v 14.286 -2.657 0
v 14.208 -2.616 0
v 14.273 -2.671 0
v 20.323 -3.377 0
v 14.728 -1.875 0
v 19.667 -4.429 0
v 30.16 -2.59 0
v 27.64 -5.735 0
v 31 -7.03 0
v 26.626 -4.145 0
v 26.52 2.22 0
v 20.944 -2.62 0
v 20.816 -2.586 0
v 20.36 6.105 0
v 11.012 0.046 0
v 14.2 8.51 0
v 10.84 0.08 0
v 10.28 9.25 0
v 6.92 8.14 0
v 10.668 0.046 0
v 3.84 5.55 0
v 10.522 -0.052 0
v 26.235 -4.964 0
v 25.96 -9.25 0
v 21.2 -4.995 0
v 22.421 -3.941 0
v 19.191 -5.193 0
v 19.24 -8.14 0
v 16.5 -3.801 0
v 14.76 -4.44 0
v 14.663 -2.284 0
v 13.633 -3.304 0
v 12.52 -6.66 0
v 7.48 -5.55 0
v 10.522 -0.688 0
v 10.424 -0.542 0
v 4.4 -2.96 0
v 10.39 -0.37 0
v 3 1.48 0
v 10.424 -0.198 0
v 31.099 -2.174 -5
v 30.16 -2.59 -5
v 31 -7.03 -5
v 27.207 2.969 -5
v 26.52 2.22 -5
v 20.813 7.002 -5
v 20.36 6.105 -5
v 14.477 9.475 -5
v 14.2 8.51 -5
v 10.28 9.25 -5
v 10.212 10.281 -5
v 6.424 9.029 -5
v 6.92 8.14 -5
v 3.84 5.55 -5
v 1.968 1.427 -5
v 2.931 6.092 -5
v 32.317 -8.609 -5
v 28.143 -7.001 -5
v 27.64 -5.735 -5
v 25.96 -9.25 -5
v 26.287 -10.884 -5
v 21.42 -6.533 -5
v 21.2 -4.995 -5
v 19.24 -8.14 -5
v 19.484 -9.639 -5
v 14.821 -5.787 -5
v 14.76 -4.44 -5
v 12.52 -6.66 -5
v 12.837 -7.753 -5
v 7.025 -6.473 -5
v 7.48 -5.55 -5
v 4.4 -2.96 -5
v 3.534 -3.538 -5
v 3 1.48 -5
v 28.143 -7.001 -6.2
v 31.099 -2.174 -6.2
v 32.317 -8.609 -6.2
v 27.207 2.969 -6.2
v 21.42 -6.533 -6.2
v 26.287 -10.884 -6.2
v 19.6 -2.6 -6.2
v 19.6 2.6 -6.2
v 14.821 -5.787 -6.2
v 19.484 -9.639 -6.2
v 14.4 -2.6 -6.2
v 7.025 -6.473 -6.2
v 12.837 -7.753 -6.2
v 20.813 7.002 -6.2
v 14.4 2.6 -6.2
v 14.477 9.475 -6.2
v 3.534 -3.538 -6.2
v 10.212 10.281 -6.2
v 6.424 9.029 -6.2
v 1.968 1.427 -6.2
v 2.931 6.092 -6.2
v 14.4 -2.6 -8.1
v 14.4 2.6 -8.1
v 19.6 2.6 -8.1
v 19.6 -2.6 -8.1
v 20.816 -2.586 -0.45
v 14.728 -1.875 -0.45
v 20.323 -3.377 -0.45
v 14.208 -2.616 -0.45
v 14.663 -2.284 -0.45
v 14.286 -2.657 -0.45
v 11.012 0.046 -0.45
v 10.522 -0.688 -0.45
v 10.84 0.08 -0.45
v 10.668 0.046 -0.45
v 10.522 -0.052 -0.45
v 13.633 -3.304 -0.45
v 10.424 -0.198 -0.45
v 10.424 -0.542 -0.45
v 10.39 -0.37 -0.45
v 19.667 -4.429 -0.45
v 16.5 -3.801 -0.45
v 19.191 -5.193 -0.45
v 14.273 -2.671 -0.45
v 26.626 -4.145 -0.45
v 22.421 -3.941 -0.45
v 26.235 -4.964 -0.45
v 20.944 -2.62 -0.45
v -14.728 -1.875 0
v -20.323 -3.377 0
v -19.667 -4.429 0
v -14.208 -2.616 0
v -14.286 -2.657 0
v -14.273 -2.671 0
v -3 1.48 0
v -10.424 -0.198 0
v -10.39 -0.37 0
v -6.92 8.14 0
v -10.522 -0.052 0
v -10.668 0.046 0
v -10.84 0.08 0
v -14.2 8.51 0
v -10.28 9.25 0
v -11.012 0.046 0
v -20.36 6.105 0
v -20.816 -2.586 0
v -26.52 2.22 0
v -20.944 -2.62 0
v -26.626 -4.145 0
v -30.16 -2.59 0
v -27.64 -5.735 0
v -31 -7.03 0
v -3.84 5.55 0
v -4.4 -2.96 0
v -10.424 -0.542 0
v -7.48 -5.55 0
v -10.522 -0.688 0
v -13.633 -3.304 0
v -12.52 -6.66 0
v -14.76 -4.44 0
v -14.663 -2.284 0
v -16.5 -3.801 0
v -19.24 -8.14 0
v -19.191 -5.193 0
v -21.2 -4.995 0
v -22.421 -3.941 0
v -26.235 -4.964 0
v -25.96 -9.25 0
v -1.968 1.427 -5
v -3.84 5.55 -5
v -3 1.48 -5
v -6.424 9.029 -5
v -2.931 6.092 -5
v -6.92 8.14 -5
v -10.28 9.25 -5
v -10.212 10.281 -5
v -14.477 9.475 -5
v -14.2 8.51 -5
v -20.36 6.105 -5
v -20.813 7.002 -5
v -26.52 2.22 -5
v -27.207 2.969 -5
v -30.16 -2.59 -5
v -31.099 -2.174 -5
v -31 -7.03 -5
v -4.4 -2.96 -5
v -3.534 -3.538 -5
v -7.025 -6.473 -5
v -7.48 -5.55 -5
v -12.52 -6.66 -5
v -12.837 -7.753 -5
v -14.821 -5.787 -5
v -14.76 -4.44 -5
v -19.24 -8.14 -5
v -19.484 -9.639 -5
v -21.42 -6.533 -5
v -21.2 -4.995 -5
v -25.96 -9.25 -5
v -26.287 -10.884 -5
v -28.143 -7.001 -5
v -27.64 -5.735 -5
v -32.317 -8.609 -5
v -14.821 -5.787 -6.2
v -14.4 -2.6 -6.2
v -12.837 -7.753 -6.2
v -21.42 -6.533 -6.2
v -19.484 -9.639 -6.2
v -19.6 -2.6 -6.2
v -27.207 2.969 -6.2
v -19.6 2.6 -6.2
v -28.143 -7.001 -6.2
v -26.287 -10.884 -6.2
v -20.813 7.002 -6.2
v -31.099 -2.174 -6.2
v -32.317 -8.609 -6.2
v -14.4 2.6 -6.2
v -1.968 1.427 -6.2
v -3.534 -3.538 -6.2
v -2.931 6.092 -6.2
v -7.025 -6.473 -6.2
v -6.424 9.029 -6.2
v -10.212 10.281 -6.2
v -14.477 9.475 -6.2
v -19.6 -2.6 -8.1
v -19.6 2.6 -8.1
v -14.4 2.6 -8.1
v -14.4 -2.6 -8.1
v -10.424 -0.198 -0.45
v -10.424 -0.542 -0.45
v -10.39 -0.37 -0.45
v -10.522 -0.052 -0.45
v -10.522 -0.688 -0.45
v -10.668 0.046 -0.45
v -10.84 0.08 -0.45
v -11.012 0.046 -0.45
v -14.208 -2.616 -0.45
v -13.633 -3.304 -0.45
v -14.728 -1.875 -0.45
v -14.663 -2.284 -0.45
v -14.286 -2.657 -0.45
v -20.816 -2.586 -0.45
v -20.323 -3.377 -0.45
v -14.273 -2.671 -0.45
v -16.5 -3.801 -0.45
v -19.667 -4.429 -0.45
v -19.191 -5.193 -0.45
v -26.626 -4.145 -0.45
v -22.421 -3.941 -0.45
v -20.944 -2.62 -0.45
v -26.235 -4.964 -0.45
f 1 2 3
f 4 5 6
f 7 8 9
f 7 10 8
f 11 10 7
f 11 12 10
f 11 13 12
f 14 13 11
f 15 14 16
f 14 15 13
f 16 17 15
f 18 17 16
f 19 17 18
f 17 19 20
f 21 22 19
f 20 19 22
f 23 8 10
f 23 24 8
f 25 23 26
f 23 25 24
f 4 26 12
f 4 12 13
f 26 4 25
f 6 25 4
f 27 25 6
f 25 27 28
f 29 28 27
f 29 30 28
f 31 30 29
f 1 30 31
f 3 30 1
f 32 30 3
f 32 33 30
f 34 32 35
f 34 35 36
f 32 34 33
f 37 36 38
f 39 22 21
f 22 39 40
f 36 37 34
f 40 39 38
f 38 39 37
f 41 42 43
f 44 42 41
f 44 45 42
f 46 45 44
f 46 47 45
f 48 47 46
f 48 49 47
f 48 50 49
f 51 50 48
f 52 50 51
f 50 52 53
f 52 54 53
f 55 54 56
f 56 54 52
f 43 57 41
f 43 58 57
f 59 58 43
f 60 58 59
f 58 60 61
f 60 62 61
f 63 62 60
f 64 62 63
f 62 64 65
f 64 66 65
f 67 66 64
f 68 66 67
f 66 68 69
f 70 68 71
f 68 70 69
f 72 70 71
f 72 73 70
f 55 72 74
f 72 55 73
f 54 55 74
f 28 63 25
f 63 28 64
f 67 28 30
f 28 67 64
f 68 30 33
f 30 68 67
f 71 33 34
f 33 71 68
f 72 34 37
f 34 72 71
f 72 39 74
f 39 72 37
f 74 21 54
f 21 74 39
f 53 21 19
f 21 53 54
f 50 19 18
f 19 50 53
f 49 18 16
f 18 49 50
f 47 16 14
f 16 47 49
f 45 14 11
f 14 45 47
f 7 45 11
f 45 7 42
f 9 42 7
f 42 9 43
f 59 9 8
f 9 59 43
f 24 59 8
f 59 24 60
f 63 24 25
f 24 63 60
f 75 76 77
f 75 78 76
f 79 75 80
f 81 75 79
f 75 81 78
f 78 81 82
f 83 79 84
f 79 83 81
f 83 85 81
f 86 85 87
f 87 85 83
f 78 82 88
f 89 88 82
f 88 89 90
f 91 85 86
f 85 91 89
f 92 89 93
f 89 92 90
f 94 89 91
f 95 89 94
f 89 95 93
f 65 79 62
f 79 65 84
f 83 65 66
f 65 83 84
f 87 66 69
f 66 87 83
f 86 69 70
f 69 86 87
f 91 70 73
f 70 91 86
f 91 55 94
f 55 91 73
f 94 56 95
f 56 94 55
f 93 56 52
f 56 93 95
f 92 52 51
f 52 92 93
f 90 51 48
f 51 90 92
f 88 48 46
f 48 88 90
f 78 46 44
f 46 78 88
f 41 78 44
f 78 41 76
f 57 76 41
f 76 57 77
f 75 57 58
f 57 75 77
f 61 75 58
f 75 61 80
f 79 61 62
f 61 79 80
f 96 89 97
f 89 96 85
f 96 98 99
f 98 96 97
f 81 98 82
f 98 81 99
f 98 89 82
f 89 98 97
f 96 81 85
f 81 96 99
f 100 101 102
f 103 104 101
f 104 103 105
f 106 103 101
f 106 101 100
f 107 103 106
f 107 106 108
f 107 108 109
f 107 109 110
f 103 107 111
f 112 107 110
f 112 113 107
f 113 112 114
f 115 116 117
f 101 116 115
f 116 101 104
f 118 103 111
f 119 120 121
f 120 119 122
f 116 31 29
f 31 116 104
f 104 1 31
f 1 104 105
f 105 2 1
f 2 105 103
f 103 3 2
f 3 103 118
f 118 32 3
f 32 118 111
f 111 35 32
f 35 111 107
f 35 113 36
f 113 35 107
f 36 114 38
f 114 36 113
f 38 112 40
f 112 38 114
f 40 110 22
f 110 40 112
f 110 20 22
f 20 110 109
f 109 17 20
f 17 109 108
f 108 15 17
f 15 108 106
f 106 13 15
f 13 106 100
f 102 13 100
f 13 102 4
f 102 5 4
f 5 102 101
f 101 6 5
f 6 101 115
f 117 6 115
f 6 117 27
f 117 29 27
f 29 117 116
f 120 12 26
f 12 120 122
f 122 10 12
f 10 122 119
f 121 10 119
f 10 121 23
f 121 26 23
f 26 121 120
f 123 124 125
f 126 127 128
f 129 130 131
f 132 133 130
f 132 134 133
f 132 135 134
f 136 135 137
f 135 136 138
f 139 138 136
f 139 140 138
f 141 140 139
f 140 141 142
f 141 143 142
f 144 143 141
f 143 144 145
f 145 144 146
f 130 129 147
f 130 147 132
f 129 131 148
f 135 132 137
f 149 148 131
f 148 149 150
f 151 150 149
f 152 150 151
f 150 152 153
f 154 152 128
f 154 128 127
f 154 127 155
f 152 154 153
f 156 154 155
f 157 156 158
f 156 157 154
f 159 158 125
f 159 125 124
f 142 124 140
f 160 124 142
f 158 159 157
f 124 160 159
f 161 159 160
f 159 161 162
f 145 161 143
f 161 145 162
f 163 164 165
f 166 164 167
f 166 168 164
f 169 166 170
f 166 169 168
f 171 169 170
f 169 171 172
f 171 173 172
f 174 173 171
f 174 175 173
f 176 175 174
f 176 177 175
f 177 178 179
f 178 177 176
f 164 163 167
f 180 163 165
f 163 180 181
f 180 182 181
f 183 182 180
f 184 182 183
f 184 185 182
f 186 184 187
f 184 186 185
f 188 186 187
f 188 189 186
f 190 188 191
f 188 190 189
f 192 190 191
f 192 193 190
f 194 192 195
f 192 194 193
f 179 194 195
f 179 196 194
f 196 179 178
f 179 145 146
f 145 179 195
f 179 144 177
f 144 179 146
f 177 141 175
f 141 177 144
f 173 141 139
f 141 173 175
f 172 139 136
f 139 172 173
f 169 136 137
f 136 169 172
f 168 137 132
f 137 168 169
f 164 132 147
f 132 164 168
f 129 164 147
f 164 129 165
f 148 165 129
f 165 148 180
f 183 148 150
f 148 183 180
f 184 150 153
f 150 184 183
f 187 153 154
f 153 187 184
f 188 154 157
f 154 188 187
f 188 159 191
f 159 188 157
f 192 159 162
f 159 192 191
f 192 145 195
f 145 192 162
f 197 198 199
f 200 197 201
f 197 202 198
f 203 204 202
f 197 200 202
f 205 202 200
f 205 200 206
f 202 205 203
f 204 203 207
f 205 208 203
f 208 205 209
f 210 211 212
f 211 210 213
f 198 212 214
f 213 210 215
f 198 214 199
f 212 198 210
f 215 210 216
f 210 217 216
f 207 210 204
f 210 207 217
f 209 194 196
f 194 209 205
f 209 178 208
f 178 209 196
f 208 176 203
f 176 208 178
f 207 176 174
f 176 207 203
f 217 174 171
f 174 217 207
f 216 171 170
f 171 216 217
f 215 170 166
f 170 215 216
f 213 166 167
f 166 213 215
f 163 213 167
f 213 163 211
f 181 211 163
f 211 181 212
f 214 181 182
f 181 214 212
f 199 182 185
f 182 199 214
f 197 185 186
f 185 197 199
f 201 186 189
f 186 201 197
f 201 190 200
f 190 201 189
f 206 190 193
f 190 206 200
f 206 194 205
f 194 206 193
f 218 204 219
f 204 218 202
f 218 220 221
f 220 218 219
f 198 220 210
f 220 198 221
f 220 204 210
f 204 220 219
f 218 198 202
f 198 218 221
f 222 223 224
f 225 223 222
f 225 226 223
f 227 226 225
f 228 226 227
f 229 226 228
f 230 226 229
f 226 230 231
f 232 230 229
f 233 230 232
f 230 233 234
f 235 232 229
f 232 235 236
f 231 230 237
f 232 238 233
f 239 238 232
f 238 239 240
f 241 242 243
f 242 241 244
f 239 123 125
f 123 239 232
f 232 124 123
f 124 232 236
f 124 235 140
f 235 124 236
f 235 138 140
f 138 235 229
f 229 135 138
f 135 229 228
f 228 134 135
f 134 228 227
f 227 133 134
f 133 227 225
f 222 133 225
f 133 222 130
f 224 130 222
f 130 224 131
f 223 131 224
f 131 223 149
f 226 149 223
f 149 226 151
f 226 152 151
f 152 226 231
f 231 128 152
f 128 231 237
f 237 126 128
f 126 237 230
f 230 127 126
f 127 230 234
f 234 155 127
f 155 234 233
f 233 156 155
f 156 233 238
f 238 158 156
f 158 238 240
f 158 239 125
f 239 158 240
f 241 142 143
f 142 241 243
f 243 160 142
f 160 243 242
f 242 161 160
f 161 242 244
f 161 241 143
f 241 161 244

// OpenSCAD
// Both wing caps as the player sees them (installed, viewed from the front). Preview only.
use <../STRUTHIO084.scad>
rotate([0,180,0]) for(s=[-1,1]) translate([s*17,0,0]) button_cap(s);
